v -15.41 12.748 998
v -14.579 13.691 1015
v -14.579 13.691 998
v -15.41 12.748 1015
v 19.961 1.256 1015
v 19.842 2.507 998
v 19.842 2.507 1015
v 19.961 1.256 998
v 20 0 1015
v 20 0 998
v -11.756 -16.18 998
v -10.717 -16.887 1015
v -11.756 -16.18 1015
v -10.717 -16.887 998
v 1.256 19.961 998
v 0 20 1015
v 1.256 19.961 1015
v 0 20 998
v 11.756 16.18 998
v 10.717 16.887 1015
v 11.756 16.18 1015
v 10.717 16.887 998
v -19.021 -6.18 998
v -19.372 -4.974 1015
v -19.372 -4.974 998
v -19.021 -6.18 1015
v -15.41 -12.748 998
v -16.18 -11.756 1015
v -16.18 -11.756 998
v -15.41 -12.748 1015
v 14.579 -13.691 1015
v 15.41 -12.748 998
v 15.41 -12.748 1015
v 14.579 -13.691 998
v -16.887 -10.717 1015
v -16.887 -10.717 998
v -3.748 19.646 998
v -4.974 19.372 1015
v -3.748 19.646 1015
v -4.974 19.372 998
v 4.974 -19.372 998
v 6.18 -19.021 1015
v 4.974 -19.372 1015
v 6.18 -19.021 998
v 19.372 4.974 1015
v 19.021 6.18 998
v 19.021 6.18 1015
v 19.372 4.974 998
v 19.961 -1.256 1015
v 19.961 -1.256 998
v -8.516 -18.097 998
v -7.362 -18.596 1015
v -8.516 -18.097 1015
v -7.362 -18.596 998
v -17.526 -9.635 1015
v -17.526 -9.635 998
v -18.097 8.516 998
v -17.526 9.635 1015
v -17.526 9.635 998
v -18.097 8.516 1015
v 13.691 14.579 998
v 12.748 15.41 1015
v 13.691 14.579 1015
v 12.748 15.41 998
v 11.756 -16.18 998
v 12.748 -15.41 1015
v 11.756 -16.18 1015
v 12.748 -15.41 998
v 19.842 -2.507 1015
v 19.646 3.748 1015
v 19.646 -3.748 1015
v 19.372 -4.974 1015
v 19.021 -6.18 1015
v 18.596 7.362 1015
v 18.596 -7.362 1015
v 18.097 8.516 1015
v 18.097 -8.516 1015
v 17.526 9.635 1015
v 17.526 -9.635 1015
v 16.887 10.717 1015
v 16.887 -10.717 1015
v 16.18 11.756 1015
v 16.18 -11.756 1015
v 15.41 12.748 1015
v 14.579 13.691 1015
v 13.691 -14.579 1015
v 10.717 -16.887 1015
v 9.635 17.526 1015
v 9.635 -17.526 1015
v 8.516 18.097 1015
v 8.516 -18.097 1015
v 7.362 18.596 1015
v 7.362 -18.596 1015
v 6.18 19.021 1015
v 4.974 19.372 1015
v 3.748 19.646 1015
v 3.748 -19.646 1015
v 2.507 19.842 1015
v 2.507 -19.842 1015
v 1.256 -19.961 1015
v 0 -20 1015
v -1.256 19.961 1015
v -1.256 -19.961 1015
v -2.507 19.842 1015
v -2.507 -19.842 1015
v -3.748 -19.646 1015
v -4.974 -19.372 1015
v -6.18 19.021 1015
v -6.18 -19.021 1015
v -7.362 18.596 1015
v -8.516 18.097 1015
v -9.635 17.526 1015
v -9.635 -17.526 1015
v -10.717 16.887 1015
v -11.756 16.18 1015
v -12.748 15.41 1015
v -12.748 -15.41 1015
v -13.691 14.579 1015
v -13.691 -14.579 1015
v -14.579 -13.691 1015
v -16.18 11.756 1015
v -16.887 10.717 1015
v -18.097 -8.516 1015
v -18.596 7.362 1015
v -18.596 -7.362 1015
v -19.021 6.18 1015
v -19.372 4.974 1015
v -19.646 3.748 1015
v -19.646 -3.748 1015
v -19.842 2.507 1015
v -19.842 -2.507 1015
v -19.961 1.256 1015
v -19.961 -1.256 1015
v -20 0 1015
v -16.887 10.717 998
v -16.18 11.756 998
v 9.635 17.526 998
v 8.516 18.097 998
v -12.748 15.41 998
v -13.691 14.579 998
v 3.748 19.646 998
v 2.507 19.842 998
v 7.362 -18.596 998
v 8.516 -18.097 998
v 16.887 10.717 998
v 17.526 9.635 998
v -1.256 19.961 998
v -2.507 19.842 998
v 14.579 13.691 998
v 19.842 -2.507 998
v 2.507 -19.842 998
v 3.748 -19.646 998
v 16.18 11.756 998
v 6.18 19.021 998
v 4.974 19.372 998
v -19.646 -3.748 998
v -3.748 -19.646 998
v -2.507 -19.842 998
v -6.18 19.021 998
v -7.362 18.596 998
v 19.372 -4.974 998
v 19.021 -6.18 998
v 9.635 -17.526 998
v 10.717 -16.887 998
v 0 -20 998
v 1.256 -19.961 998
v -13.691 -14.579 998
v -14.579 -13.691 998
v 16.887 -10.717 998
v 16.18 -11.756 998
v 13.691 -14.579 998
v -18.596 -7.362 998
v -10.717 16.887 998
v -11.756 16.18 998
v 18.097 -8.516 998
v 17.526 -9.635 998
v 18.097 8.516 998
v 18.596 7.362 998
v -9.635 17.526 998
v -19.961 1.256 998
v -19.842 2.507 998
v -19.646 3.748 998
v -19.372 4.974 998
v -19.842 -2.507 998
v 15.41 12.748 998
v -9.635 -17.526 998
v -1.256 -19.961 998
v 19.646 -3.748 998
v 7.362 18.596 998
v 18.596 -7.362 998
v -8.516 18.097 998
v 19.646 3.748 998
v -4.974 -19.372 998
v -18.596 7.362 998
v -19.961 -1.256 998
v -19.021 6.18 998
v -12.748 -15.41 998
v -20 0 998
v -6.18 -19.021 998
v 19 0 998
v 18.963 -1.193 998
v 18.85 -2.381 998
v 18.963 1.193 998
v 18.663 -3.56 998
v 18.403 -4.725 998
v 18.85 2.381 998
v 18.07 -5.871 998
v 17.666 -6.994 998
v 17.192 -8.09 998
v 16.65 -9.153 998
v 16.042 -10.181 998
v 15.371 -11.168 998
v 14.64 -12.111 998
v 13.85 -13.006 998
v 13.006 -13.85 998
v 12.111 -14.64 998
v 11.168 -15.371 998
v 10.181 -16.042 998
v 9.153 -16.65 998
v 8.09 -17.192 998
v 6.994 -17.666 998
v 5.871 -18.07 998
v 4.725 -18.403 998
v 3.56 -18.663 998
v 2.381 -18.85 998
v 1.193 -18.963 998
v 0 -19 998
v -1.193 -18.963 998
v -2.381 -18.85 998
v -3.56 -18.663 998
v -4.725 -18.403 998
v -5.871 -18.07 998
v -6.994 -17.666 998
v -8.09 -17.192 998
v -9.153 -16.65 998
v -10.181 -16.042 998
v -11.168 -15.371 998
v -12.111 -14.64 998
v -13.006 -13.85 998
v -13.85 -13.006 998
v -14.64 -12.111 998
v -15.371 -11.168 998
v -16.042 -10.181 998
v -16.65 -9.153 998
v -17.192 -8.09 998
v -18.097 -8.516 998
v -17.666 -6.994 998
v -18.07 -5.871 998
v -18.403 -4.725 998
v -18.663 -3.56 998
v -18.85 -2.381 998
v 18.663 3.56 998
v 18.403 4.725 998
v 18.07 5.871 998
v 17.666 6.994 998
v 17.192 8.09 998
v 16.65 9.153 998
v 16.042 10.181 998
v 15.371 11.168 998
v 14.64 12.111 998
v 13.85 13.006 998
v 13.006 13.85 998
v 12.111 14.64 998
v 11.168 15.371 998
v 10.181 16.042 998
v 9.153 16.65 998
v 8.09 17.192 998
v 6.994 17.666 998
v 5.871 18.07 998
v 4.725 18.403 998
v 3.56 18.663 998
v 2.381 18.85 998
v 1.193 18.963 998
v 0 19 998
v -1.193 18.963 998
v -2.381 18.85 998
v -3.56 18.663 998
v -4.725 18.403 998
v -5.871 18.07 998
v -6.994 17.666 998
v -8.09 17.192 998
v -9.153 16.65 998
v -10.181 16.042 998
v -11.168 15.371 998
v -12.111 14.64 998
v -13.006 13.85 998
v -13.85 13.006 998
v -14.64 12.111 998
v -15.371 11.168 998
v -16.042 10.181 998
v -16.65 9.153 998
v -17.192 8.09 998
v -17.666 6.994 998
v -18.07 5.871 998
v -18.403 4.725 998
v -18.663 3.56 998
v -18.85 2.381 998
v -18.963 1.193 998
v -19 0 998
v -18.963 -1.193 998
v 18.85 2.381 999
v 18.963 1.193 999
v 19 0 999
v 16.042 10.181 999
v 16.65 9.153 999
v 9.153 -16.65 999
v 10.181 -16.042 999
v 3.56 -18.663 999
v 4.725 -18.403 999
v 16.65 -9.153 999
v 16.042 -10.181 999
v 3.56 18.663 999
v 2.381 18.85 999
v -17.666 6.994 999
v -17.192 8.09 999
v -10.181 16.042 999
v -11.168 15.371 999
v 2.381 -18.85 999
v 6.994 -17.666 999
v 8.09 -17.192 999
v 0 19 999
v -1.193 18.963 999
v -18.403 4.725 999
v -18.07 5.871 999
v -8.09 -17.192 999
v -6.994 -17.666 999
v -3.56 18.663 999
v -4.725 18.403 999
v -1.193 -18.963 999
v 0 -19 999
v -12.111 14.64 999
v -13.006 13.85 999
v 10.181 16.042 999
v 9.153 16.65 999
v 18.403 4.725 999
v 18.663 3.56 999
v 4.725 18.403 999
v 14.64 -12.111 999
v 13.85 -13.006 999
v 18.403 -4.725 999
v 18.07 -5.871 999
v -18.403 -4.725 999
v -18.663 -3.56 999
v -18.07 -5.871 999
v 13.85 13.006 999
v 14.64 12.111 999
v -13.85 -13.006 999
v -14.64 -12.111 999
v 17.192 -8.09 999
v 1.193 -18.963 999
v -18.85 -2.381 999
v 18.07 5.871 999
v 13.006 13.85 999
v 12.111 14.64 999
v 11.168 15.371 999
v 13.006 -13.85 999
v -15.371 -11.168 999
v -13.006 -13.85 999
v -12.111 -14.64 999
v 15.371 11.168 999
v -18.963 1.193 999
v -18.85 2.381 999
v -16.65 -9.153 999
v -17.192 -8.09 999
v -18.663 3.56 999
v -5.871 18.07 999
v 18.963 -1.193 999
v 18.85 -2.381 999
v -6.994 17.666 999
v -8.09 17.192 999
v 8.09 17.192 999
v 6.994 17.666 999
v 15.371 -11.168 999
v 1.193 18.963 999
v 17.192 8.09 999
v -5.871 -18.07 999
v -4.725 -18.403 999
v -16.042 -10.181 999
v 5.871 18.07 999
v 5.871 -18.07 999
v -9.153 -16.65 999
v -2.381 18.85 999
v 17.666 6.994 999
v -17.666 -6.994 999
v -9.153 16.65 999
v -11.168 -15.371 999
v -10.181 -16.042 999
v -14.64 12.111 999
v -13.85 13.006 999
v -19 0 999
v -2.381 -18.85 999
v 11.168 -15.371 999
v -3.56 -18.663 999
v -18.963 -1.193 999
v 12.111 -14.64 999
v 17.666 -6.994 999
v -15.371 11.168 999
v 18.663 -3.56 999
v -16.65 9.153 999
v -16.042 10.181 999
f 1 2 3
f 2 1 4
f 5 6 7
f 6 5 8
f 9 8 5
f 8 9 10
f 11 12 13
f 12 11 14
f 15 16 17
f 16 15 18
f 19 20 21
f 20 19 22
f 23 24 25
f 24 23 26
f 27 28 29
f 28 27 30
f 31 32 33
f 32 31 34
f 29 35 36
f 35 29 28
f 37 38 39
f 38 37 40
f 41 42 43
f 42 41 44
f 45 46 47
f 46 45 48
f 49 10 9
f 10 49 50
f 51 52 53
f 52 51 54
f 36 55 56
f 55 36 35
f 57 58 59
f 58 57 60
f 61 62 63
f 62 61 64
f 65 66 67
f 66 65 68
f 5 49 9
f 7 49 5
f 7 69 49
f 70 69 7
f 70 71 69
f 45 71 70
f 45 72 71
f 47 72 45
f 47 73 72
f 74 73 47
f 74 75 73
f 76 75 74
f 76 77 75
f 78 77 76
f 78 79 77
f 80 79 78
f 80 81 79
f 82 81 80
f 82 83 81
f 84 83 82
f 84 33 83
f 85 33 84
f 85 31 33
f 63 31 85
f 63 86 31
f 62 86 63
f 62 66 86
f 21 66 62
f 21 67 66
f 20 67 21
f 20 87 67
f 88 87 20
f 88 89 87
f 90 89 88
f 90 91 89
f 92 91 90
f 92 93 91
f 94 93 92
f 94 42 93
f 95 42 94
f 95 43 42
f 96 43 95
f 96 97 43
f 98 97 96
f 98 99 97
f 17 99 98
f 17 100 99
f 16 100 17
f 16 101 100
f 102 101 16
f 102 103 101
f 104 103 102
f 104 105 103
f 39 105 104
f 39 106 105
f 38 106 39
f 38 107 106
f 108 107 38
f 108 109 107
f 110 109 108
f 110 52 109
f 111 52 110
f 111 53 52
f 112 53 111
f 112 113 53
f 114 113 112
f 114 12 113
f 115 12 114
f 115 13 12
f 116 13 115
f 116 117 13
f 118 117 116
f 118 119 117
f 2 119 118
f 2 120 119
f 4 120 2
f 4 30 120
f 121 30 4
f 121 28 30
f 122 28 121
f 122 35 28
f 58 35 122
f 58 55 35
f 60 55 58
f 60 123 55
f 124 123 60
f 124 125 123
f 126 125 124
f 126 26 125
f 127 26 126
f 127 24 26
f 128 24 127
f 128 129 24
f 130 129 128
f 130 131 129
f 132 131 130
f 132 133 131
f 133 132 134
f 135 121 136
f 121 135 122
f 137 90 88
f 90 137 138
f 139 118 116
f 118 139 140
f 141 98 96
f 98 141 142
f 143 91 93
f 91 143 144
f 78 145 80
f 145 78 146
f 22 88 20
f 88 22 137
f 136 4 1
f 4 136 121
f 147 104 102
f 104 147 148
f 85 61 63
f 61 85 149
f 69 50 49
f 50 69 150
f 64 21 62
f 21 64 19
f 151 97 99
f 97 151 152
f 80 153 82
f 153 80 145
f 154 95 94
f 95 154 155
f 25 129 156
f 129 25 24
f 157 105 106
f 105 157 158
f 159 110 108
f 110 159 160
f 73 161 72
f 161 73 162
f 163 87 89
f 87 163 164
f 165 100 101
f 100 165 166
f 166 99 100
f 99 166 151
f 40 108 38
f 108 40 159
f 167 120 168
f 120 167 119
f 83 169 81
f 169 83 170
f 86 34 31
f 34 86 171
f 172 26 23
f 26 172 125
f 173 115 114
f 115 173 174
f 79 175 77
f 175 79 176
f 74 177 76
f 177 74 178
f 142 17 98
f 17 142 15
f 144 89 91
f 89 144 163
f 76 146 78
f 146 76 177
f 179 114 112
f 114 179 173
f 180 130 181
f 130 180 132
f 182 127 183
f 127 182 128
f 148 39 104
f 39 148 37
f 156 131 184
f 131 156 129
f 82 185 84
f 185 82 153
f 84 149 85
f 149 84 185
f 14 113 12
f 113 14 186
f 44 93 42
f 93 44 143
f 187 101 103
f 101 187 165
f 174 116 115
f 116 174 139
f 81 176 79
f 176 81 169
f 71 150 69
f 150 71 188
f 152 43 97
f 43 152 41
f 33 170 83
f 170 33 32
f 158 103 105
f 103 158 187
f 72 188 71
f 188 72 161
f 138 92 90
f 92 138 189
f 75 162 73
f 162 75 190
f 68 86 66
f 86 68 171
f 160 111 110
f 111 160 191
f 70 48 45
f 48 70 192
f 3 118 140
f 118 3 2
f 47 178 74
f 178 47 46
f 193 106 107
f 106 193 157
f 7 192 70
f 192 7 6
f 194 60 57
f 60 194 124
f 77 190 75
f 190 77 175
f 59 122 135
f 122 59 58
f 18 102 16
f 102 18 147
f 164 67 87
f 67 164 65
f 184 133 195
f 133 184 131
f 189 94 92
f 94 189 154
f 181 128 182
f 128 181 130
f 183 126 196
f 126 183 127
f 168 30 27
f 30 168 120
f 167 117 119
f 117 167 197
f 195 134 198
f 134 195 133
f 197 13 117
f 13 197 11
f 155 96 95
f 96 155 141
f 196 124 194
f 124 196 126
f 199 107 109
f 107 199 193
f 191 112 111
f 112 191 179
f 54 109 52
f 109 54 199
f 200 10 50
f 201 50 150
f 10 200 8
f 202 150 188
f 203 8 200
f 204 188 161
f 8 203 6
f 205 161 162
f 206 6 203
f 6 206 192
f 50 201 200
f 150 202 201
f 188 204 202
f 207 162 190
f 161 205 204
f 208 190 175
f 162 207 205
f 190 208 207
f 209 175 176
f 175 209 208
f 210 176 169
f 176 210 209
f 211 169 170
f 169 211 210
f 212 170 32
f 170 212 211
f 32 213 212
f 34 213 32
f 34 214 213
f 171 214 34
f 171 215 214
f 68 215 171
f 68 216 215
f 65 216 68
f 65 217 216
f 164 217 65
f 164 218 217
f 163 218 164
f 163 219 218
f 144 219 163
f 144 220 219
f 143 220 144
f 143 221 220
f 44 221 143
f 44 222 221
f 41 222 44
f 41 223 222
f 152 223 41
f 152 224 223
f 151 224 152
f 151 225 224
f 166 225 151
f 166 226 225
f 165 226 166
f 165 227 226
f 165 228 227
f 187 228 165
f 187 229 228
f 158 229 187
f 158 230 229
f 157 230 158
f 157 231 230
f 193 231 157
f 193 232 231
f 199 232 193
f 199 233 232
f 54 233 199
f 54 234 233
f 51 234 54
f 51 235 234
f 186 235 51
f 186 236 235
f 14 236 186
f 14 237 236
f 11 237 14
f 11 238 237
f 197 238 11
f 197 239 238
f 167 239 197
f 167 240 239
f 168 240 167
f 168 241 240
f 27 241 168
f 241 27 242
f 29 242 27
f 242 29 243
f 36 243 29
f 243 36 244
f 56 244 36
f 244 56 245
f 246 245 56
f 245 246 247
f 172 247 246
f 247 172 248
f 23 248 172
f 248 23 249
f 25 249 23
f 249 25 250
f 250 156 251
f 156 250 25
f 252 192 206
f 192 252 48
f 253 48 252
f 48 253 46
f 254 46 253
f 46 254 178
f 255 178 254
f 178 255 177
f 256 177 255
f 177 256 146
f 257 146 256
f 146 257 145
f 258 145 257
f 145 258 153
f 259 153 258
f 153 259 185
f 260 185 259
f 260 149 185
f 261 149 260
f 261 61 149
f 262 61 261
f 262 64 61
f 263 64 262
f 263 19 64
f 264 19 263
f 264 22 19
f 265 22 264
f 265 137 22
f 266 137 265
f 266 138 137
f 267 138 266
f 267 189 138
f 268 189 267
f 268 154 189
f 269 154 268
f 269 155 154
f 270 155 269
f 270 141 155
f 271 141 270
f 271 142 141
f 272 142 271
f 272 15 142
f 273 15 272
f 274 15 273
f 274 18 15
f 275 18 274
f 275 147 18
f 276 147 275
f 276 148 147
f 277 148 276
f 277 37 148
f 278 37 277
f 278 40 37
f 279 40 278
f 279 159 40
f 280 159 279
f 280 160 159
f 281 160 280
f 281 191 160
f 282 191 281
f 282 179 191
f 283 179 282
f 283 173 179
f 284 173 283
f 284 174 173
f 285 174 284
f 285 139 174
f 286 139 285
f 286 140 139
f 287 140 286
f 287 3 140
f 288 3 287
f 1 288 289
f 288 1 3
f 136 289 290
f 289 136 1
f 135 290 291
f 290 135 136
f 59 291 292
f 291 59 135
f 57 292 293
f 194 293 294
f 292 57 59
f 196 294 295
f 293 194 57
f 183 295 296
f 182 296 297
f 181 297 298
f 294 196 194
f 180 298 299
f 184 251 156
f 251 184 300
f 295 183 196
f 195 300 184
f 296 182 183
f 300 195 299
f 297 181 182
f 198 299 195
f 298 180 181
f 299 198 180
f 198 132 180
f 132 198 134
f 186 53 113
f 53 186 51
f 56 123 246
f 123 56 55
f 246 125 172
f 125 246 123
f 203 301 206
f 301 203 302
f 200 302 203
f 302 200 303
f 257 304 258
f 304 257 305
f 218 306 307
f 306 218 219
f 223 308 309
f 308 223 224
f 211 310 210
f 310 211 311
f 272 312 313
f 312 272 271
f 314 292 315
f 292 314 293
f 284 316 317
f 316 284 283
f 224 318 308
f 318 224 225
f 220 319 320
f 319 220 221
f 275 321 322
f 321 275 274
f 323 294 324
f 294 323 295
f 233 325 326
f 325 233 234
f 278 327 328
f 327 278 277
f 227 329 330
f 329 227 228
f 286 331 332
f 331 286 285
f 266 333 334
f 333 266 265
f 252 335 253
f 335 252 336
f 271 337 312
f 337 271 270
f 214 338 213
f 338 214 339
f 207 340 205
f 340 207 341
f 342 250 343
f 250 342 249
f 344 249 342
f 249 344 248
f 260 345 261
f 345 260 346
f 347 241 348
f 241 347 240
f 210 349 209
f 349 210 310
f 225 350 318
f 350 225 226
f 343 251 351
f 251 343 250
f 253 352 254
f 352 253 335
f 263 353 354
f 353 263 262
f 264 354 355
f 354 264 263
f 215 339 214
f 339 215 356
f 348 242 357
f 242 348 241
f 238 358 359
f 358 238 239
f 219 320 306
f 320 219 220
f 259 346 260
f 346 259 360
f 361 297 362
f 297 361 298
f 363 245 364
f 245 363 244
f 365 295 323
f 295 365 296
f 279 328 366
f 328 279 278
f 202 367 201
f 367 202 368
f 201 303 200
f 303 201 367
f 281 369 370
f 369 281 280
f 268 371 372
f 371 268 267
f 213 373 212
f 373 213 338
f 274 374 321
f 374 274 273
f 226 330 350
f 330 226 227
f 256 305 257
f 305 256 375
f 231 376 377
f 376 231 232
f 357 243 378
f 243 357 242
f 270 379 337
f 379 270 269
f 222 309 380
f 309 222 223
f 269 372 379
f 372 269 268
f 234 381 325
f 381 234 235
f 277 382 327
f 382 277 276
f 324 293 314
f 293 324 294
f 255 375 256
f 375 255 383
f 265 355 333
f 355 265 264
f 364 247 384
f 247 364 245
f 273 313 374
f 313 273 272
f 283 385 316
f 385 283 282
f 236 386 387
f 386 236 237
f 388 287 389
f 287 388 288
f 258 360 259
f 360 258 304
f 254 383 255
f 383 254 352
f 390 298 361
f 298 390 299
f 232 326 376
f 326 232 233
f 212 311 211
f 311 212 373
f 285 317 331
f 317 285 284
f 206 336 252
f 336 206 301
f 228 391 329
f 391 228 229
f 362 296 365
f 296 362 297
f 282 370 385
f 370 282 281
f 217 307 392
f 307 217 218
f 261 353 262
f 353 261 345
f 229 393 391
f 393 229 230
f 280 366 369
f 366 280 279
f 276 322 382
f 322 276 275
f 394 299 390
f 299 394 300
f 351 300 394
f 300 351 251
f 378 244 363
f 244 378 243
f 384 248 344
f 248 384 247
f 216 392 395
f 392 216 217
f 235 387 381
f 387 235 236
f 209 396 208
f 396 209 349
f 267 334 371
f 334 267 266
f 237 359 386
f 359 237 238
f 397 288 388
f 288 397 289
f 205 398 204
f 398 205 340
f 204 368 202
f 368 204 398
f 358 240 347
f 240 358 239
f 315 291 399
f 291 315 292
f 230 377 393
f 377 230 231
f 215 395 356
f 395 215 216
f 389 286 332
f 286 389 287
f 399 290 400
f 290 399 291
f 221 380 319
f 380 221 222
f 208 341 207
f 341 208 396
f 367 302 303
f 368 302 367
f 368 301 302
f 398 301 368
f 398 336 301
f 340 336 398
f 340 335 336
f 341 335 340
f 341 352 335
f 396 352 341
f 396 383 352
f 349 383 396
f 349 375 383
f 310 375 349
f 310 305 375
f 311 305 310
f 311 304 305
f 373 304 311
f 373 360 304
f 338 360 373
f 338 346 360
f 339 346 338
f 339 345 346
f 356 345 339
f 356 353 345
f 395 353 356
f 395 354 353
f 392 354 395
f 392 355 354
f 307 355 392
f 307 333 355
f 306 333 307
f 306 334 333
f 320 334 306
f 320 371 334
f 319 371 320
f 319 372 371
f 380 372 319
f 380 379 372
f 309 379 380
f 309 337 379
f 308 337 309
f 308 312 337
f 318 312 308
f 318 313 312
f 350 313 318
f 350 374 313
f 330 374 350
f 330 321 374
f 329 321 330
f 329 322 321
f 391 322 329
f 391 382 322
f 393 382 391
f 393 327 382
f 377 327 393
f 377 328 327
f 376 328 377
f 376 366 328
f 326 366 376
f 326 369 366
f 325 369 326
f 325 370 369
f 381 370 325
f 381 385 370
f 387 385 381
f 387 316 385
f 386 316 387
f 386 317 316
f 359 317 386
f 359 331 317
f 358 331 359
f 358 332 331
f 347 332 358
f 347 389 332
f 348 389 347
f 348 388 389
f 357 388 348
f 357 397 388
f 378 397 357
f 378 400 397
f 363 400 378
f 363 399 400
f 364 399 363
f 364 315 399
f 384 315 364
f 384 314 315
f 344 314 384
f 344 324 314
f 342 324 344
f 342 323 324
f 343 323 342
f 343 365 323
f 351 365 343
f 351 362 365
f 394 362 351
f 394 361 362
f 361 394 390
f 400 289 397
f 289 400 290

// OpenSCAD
 difference(){
//translate([0,0,-2])linear_extrude(17)circle(20, $fn = 100);
//translate([0,0,-2])linear_extrude(1)circle(19, $fn = 100);
        translate([0,0,998])cylinder(h=17, r=20, $fn = 100);
        translate([0,0,998])cylinder(h=1, r=19, $fn = 100);
    }
